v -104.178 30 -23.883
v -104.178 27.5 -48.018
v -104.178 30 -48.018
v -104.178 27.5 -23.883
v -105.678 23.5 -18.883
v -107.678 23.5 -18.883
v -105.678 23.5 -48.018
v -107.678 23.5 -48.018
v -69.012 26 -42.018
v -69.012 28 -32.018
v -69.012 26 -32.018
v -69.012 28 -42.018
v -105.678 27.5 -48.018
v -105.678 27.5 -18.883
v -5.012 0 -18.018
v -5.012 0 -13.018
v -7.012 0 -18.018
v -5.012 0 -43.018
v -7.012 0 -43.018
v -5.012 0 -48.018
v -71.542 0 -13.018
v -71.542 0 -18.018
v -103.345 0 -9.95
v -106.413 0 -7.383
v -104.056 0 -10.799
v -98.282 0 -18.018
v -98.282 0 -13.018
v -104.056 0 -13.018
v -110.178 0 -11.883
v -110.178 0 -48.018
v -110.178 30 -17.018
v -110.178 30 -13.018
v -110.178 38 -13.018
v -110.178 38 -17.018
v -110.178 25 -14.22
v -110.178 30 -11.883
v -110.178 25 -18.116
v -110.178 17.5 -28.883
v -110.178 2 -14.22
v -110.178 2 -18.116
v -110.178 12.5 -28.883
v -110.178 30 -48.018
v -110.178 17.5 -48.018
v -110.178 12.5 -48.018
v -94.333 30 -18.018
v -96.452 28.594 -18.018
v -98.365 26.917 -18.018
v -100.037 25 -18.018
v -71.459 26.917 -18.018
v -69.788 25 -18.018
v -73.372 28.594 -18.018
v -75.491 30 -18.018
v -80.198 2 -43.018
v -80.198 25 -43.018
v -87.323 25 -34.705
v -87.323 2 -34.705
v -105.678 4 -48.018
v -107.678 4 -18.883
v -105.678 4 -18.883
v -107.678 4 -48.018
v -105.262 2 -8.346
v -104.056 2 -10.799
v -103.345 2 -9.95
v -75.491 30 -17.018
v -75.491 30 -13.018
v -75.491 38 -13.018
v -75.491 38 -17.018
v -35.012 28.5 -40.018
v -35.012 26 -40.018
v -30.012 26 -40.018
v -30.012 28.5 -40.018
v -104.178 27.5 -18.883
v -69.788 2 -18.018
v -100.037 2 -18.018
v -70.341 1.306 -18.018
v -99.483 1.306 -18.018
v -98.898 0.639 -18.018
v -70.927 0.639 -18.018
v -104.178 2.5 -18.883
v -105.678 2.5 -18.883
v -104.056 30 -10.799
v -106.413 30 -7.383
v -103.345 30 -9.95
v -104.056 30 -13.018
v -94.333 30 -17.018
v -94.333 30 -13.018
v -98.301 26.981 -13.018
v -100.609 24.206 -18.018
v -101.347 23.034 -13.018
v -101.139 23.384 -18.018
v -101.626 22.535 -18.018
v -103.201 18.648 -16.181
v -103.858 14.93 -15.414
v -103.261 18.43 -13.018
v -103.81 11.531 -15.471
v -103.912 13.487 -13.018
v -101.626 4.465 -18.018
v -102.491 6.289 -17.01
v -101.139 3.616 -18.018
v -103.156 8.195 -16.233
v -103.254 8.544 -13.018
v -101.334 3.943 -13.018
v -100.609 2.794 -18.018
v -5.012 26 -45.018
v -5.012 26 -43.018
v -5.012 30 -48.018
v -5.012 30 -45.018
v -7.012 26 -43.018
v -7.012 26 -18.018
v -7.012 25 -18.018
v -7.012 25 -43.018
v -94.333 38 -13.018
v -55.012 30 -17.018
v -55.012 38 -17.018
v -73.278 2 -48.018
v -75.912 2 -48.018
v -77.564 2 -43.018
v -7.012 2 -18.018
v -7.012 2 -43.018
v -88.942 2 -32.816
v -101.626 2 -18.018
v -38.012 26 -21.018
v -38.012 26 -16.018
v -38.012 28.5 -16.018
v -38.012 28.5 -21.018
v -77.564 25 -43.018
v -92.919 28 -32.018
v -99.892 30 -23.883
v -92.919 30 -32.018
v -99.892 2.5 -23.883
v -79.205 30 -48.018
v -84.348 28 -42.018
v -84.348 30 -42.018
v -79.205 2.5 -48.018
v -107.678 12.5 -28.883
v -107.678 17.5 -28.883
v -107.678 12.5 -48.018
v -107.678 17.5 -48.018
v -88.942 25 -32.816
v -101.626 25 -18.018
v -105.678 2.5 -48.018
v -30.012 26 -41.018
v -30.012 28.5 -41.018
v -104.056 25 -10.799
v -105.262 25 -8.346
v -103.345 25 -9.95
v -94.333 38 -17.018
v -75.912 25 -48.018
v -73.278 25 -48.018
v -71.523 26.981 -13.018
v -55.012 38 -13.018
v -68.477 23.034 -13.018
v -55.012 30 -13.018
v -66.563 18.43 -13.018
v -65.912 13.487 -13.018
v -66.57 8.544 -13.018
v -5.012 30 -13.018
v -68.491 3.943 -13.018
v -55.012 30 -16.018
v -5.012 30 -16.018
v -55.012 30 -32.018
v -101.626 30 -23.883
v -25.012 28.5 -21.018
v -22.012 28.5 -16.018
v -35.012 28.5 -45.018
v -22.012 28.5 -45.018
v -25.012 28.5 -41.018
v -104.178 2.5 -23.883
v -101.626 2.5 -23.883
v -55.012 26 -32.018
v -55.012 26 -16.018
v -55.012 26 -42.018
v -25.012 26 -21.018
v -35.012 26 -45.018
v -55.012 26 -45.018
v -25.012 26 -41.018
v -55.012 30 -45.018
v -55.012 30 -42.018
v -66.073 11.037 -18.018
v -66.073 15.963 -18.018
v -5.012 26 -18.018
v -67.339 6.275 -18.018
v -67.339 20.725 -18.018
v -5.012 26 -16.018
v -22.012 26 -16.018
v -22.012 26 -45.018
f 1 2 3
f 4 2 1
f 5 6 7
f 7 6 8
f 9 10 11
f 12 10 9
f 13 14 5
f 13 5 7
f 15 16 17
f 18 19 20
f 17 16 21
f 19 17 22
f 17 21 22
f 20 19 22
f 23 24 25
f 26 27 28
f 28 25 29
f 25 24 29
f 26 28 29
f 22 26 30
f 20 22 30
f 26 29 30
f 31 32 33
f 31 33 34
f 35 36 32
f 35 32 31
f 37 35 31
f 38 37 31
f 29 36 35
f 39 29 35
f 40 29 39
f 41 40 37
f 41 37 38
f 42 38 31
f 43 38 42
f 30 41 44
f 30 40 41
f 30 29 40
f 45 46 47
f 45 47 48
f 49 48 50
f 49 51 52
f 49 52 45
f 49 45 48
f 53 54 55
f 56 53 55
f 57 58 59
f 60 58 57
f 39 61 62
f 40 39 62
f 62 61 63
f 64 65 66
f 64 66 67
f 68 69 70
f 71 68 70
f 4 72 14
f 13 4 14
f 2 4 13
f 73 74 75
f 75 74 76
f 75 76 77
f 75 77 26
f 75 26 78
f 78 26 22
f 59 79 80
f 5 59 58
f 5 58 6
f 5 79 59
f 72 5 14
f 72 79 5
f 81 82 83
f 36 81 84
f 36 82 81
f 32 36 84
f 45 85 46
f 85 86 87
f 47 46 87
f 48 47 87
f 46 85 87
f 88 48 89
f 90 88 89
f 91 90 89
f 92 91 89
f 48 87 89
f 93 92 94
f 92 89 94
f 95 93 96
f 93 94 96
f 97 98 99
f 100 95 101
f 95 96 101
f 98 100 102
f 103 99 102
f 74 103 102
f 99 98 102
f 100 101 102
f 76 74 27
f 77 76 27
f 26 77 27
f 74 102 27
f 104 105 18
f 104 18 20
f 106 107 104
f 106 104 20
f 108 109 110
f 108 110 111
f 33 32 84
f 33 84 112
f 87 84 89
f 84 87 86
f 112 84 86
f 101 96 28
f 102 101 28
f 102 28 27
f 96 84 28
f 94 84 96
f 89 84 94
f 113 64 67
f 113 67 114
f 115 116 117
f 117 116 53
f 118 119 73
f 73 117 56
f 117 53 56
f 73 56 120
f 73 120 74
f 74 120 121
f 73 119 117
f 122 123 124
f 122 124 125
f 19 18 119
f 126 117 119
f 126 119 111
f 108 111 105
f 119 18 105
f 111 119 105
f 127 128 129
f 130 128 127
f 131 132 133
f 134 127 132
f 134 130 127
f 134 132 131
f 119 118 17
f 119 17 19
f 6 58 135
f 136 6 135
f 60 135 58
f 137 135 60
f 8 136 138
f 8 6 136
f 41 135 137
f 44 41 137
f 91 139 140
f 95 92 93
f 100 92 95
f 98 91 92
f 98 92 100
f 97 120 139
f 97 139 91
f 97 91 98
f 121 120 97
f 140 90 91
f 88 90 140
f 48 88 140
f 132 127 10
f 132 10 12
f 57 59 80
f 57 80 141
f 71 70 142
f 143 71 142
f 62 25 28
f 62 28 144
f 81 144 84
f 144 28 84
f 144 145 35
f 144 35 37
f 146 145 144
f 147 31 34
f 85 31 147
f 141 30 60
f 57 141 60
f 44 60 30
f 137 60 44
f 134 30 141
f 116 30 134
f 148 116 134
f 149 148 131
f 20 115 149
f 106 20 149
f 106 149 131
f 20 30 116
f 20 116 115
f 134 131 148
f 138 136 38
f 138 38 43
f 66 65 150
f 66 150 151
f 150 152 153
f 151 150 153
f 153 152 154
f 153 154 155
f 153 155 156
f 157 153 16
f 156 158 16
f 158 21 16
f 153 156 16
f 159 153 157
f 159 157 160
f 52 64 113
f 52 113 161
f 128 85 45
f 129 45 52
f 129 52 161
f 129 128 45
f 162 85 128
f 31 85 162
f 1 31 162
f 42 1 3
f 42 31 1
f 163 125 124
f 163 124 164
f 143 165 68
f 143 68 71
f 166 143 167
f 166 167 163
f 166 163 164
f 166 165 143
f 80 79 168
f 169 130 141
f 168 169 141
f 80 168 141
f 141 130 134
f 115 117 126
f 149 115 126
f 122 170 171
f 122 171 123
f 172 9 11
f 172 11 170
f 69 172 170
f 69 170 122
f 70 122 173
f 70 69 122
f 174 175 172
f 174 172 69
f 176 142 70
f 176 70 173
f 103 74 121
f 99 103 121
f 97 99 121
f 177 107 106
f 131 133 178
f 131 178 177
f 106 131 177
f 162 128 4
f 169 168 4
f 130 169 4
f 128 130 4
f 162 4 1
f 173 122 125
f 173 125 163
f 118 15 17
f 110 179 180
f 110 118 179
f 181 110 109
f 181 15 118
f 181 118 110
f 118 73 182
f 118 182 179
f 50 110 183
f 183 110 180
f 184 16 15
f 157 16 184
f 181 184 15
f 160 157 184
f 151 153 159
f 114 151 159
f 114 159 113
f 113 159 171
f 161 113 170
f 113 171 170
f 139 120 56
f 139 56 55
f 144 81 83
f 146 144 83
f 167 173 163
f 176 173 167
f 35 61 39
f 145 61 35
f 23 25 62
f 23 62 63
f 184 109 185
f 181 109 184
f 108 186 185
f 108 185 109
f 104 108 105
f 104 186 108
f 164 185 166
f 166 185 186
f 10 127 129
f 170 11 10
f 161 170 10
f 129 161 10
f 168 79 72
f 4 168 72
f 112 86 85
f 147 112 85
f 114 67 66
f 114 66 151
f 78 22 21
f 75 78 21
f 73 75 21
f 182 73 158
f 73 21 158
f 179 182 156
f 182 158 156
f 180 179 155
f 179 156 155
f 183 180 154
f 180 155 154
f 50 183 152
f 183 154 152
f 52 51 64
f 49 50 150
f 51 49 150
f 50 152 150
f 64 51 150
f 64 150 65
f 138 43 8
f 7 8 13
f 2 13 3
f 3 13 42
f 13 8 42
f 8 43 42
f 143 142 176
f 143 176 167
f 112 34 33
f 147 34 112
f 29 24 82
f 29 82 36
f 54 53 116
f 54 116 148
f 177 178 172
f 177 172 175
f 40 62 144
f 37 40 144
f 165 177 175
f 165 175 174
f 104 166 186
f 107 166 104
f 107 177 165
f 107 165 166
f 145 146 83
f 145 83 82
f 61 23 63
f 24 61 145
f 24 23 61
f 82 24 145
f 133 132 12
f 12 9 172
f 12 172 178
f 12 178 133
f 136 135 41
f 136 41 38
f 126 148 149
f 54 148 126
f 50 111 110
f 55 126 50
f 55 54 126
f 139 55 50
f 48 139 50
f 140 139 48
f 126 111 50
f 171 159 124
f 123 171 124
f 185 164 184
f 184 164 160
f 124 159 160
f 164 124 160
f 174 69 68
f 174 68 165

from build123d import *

# Parameters (mm, degrees)
BOSS_EXTRUDE3_DEPTH       = 30
SKETCH6_W                 = 25
SKETCH6_H                 = 23
CUT_EXTRUDE1_DEPTH        = 86
SKETCH7_W                 = 25
SKETCH7_H                 = 5
CUT_EXTRUDE2_DEPTH        = 7.5
SKETCH8_W                 = 25
SKETCH8_H                 = 2
CUT_EXTRUDE3_DEPTH        = 1
SKETCH9_R                 = 19
CUT_EXTRUDE4_DEPTH        = 5
BOSS_EXTRUDE4_DEPTH       = 30
SKETCH10_W                = 1.856561782
SKETCH10_H                = 30
BOSS_EXTRUDE5_DEPTH       = 3
BOSS_EXTRUDE6_DEPTH       = 30
SKETCH11_W                = 2.5
SKETCH11_H                = 23
CUT_EXTRUDE5_DEPTH        = 34.579503854
SKETCH12_W                = 29.135235428
SKETCH12_H                = 25
CUT_EXTRUDE6_DEPTH        = 3.5
SKETCH13_W                = 19.135235428
SKETCH13_H                = 5
CUT_EXTRUDE7_DEPTH        = 3.5
SKETCH14_W                = 29.135235428
SKETCH14_H                = 4
BOSS_EXTRUDE7_DEPTH       = 2
SKETCH16_W                = 29.135235428
SKETCH16_H                = 1.5
BOSS_EXTRUDE8_DEPTH       = 2
SKETCH17_W                = 2.551467674
SKETCH17_H                = 30
BOSS_EXTRUDE9_DEPTH       = 5
BOSS_EXTRUDE10_REACH      = 85.266
SKETCH18_W                = 29.135235428
SKETCH18_H                = 2.5
SKETCH19_W                = 2.48850009
SKETCH19_H                = 23
BOSS_EXTRUDE11_DEPTH      = 2
CUT_EXTRUDE8_START        = -2.4885
SKETCH20_W                = 2
SKETCH20_H                = 23
CUT_EXTRUDE8_DEPTH        = 21.736568
BOSS_EXTRUDE12_REACH      = 82.714
SKETCH21_W                = 2.023287715
SKETCH21_H                = 27.5
SKETCH22_W                = 35
SKETCH22_H                = 30
BOSS_EXTRUDE13_DEPTH      = 15.9
BOSS_EXTRUDE13_DEPTH_BACK = 7.5
SKETCH23_W                = 25
SKETCH23_H                = 23
CUT_EXTRUDE9_DEPTH        = 24.4
SKETCH24_W                = 25
SKETCH24_H                = 5
CUT_EXTRUDE10_DEPTH       = 2
SKETCH25_W                = 50
SKETCH25_H                = 29
CUT_EXTRUDE11_DEPTH       = 4
SKETCH26_W                = 3
SKETCH26_H                = 29
BOSS_EXTRUDE14_DEPTH      = 2.5
SKETCH27_W                = 5
SKETCH27_H                = 5
BOSS_EXTRUDE15_DEPTH      = 2.5
BOSS_EXTRUDE16_REACH      = 27
SKETCH28_W                = 4
SKETCH28_H                = 2.5
SKETCH29_W                = 13
SKETCH29_H                = 5
BOSS_EXTRUDE17_DEPTH      = 2.5
SKETCH30_W                = 10
SKETCH30_H                = 4
CUT_EXTRUDE12_DEPTH       = 14
CUT_EXTRUDE13_REACH       = 43.166
SKETCH31_W                = 10
SKETCH31_H                = 2
SKETCH32_W                = 2
SKETCH32_H                = 25
CUT_EXTRUDE14_DEPTH       = 27
SKETCH33_W                = 20.479278159
SKETCH33_H                = 4
BOSS_EXTRUDE18_DEPTH      = 8
SKETCH34_W                = 15.845031547
SKETCH34_H                = 4
BOSS_EXTRUDE19_DEPTH      = 8


with BuildPart() as part:
    # Sketch2 → Boss-Extrude3 (new body)
    with BuildSketch(Plane(origin=(0, 0, 0), x_dir=(1, 0, 0), z_dir=(0, 1, 0))):
        Polygon((-105.912162162, 13.018018018), (-20.912162162, 13.018018018), (-20.912162162, 48.018018018), (-75.912162162, 48.018018018), align=None)
    extrude(amount=BOSS_EXTRUDE3_DEPTH)

    # Sketch6 → Cut-Extrude1 (cut, through all)
    with BuildSketch(Plane(origin=(-20.912162162, 0, 0), x_dir=(0, 0, -1), z_dir=(1, 0, 0))):
        with Locations((30.518018018, 13.5)):
            Rectangle(SKETCH6_W, SKETCH6_H)
    extrude(amount=-CUT_EXTRUDE1_DEPTH, mode=Mode.SUBTRACT)

    # Sketch7 → Cut-Extrude2 (cut)
    with BuildSketch(Plane(origin=(-20.912162162, 0, 0), x_dir=(0, 0, -1), z_dir=(1, 0, 0))):
        with Locations((30.518018018, 27.5)):
            Rectangle(SKETCH7_W, SKETCH7_H)
    extrude(amount=-CUT_EXTRUDE2_DEPTH, mode=Mode.SUBTRACT)

    # Sketch8 → Cut-Extrude3 (cut)
    with BuildSketch(Plane(origin=(-20.912162162, 0, 0), x_dir=(0, 0, -1), z_dir=(1, 0, 0))):
        with Locations((30.518018018, 1)):
            Rectangle(SKETCH8_W, SKETCH8_H)
    extrude(amount=-CUT_EXTRUDE3_DEPTH, mode=Mode.SUBTRACT)

    # Sketch9 → Cut-Extrude4 (cut)
    with BuildSketch(Plane.XY.offset(-13.018018018)):
        with Locations((-84.912162162, 13.5)):
            Circle(SKETCH9_R)
    extrude(amount=-CUT_EXTRUDE4_DEPTH, mode=Mode.SUBTRACT)

    # Sketch3 → Boss-Extrude4 (add)
    with BuildSketch(Plane(origin=(0, 0, 0), x_dir=(1, 0, 0), z_dir=(0, 1, 0))):
        Polygon((-106.412808957, 7.383361614), (-110.17791555, 11.88278259), (-79.204856611, 48.018018018), (-75.912162162, 48.018018018), (-105.912162162, 13.018018018), (-103.345157358, 9.950366419), align=None)
    extrude(amount=BOSS_EXTRUDE4_DEPTH)

    # Sketch10 → Boss-Extrude5 (add)
    with BuildSketch(Plane.XY.offset(-13.018018018)):
        with Locations((-104.983881271, 15)):
            Rectangle(SKETCH10_W, SKETCH10_H)
    extrude(amount=BOSS_EXTRUDE5_DEPTH)

    # Sketch4 → Boss-Extrude6 (add)
    with BuildSketch(Plane(origin=(0, 0, 0), x_dir=(1, 0, 0), z_dir=(0, 1, 0))):
        Polygon((-110.17791555, 11.88278259), (-110.17791555, 48.018018018), (-104.17791555, 48.018018018), (-104.17791555, 18.88278259), align=None)
    extrude(amount=BOSS_EXTRUDE6_DEPTH)

    # Sketch11 → Cut-Extrude5 (cut, through all)
    with BuildSketch(Plane(origin=(-47.459390138, 0, -56.715466139), x_dir=(0.7669129, 0, -0.641751201), z_dir=(0.641751201, 0, 0.7669129))):
        with Locations((-74.121074711, 13.5)):
            Rectangle(SKETCH11_W, SKETCH11_H)
    extrude(amount=-CUT_EXTRUDE5_DEPTH, mode=Mode.SUBTRACT)

    # Sketch12 → Cut-Extrude6 (cut)
    with BuildSketch(Plane(origin=(-104.17791555, 0, 0), x_dir=(0, 0, -1), z_dir=(1, 0, 0))):
        with Locations((33.450400304, 15)):
            Rectangle(SKETCH12_W, SKETCH12_H)
    extrude(amount=-CUT_EXTRUDE6_DEPTH, mode=Mode.SUBTRACT)

    # Sketch13 → Cut-Extrude7 (cut, through all)
    with BuildSketch(Plane(origin=(-107.67791555, 0, 0), x_dir=(0, 0, -1), z_dir=(1, 0, 0))):
        with Locations((38.450400304, 15)):
            Rectangle(SKETCH13_W, SKETCH13_H)
    extrude(amount=-CUT_EXTRUDE7_DEPTH, mode=Mode.SUBTRACT)

    # Sketch14 → Boss-Extrude7 (add)
    with BuildSketch(Plane(origin=(-107.67791555, 0, 0), x_dir=(0, 0, -1), z_dir=(1, 0, 0))):
        with Locations((33.450400304, 25.5)):
            Rectangle(SKETCH14_W, SKETCH14_H)
    extrude(amount=BOSS_EXTRUDE7_DEPTH)

    # Sketch16 → Boss-Extrude8 (add)
    with BuildSketch(Plane(origin=(-107.67791555, 0, 0), x_dir=(0, 0, -1), z_dir=(1, 0, 0))):
        with Locations((33.450400304, 3.25)):
            Rectangle(SKETCH16_W, SKETCH16_H)
    extrude(amount=BOSS_EXTRUDE8_DEPTH)

    # Sketch17 → Boss-Extrude9 (add)
    with BuildSketch(Plane(origin=(0, 0, -18.88278259), x_dir=(-1, 0, 0), z_dir=(0, 0, -1))):
        with Locations((102.902181713, 15)):
            Rectangle(SKETCH17_W, SKETCH17_H)
    extrude(amount=BOSS_EXTRUDE9_DEPTH)

    # Boss-Extrude10: up to this face of the body (flat: up to its plane)
    boss_extrude10_end = Plane(part.part.faces().sort_by_distance((-90.415652244, 15, -34.938756447))[0])
    # Sketch18 → Boss-Extrude10 (add, up to the picked face)
    with BuildSketch(Plane(origin=(-104.17791555, 0, 0), x_dir=(0, 0, -1), z_dir=(1, 0, 0)), mode=Mode.PRIVATE) as boss_extrude10_sk1:
        with Locations((33.450400304, 1.25)):
            Rectangle(SKETCH18_W, SKETCH18_H)
    boss_extrude10_tool1 = split(extrude(boss_extrude10_sk1.sketch, amount=BOSS_EXTRUDE10_REACH, mode=Mode.PRIVATE), bisect_by=boss_extrude10_end, keep=Keep.BOTH, mode=Mode.PRIVATE)
    add(boss_extrude10_tool1.solids().sort_by_distance((-104.177916, 1.25, -33.4504))[0])

    # Sketch19 → Boss-Extrude11 (add)
    with BuildSketch(Plane(origin=(-67.487678855, 0, -57.846581876), x_dir=(0.650791373, 0, -0.759256602), z_dir=(0.759256602, 0, 0.650791373))):
        with Locations((-31.723015124, 13.5)):
            Rectangle(SKETCH19_W, SKETCH19_H)
    extrude(amount=BOSS_EXTRUDE11_DEPTH)

    # Sketch20 → Cut-Extrude8 (cut)
    with BuildSketch(Plane(origin=(-19.835317387, 0, 23.141203618), x_dir=(-0.759256602, 0, -0.650791373), z_dir=(0.650791373, 0, -0.759256602)).offset(CUT_EXTRUDE8_START)):
        with Locations((87.886522218, 13.5)):
            Rectangle(SKETCH20_W, SKETCH20_H)
    extrude(amount=CUT_EXTRUDE8_DEPTH, mode=Mode.SUBTRACT)

    # Boss-Extrude12: up to this face of the body (flat: up to its plane)
    boss_extrude12_end = Plane(part.part.faces().sort_by_distance((-90.415652244, 16.25, -34.938756447))[0])
    # Sketch21 → Boss-Extrude12 (add, up to the picked face)
    with BuildSketch(Plane(origin=(-101.626447876, 0, 0), x_dir=(0, 0, -1), z_dir=(1, 0, 0)), mode=Mode.PRIVATE) as boss_extrude12_sk1:
        with Locations((22.871138733, 16.25)):
            Rectangle(SKETCH21_W, SKETCH21_H)
    boss_extrude12_tool1 = split(extrude(boss_extrude12_sk1.sketch, amount=BOSS_EXTRUDE12_REACH, mode=Mode.PRIVATE), bisect_by=boss_extrude12_end, keep=Keep.BOTH, mode=Mode.PRIVATE)
    add(boss_extrude12_tool1.solids().sort_by_distance((-101.626448, 16.25, -22.871139))[0])

    # Sketch22 → Boss-Extrude13 (add, two sides)
    with BuildSketch(Plane(origin=(-20.912162162, 0, 0), x_dir=(0, 0, -1), z_dir=(1, 0, 0))) as boss_extrude13_sk:
        with Locations((30.518018018, 15)):
            Rectangle(SKETCH22_W, SKETCH22_H)
    extrude(amount=BOSS_EXTRUDE13_DEPTH)
    extrude(boss_extrude13_sk.sketch, amount=-BOSS_EXTRUDE13_DEPTH_BACK)

    # Sketch23 → Cut-Extrude9 (cut, through all)
    with BuildSketch(Plane.ZY.offset(28.412162162)):
        with Locations((-30.518018018, 13.5)):
            Rectangle(SKETCH23_W, SKETCH23_H)
    extrude(amount=-CUT_EXTRUDE9_DEPTH, mode=Mode.SUBTRACT)

    # Sketch24 → Cut-Extrude10 (cut)
    with BuildSketch(Plane(origin=(-5.012162162, 0, 0), x_dir=(0, 0, -1), z_dir=(1, 0, 0))):
        with Locations((30.518018018, 27.5)):
            Rectangle(SKETCH24_W, SKETCH24_H)
    extrude(amount=-CUT_EXTRUDE10_DEPTH, mode=Mode.SUBTRACT)

    # Sketch25 → Cut-Extrude11 (cut)
    with BuildSketch(Plane(origin=(0, 30, 0), x_dir=(1, 0, 0), z_dir=(0, 1, 0))):
        with Locations((-30.012162162, 30.518018018)):
            Rectangle(SKETCH25_W, SKETCH25_H)
    extrude(amount=-CUT_EXTRUDE11_DEPTH, mode=Mode.SUBTRACT)

    # Sketch26 → Boss-Extrude14 (add)
    with BuildSketch(Plane(origin=(0, 26, 0), x_dir=(1, 0, 0), z_dir=(0, 1, 0))):
        with Locations((-23.512162162, 30.518018018)):
            Rectangle(SKETCH26_W, SKETCH26_H)
    extrude(amount=BOSS_EXTRUDE14_DEPTH)

    # Sketch27 → Boss-Extrude15 (add)
    with BuildSketch(Plane(origin=(0, 26, 0), x_dir=(1, 0, 0), z_dir=(0, 1, 0))):
        with Locations((-32.512162162, 42.518018018)):
            Rectangle(SKETCH27_W, SKETCH27_H)
    extrude(amount=BOSS_EXTRUDE15_DEPTH)

    # Sketch28 → Boss-Extrude16 (add, up to next)
    with BuildSketch(Plane(origin=(-30.012162162, 0, 0), x_dir=(0, 0, -1), z_dir=(1, 0, 0)), mode=Mode.PRIVATE) as boss_extrude16_sk1:
        with Locations((43.018018018, 27.25)):
            Rectangle(SKETCH28_W, SKETCH28_H)
    boss_extrude16_tool1 = extrude(boss_extrude16_sk1.sketch, amount=BOSS_EXTRUDE16_REACH, mode=Mode.PRIVATE) - part.part
    add(boss_extrude16_tool1.solids().sort_by_distance((-30.012162, 27.25, -43.018018))[0])

    # Sketch29 → Boss-Extrude17 (add)
    with BuildSketch(Plane(origin=(0, 26, 0), x_dir=(1, 0, 0), z_dir=(0, 1, 0))):
        with Locations((-31.512162162, 18.518018018)):
            Rectangle(SKETCH29_W, SKETCH29_H)
    extrude(amount=BOSS_EXTRUDE17_DEPTH)

    # Sketch30 → Cut-Extrude12 (cut)
    with BuildSketch(Plane(origin=(-55.012162162, 0, 0), x_dir=(0, 0, -1), z_dir=(1, 0, 0))):
        with Locations((37.018018018, 28)):
            Rectangle(SKETCH30_W, SKETCH30_H)
    extrude(amount=-CUT_EXTRUDE12_DEPTH, mode=Mode.SUBTRACT)

    # Sketch31 → Cut-Extrude13 (cut, up to next)
    with BuildSketch(Plane(origin=(-69.012162162, 0, 0), x_dir=(0, 0, -1), z_dir=(1, 0, 0)), mode=Mode.PRIVATE) as cut_extrude13_sk1:
        with Locations((37.018018018, 29)):
            Rectangle(SKETCH31_W, SKETCH31_H)
    cut_extrude13_tool1 = extrude(cut_extrude13_sk1.sketch, amount=-CUT_EXTRUDE13_REACH, mode=Mode.PRIVATE) & part.part
    add(cut_extrude13_tool1.solids().sort_by_distance((-69.012162, 29, -37.018018))[0], mode=Mode.SUBTRACT)

    # Sketch32 → Cut-Extrude14 (cut, through all)
    with BuildSketch(Plane(origin=(0, 26, 0), x_dir=(1, 0, 0), z_dir=(0, 1, 0))):
        with Locations((-6.012162162, 30.518018018)):
            Rectangle(SKETCH32_W, SKETCH32_H)
    extrude(amount=-CUT_EXTRUDE14_DEPTH, mode=Mode.SUBTRACT)

    # Sketch33 → Boss-Extrude18 (add)
    with BuildSketch(Plane(origin=(0, 30, 0), x_dir=(1, 0, 0), z_dir=(0, 1, 0))):
        with Locations((-65.251801242, 15.018018018)):
            Rectangle(SKETCH33_W, SKETCH33_H)
    extrude(amount=BOSS_EXTRUDE18_DEPTH)

    # Sketch34 → Boss-Extrude19 (add)
    with BuildSketch(Plane(origin=(0, 30, 0), x_dir=(1, 0, 0), z_dir=(0, 1, 0))):
        with Locations((-102.255399777, 15.018018018)):
            Rectangle(SKETCH34_W, SKETCH34_H)
    extrude(amount=BOSS_EXTRUDE19_DEPTH)


solid = part.part
